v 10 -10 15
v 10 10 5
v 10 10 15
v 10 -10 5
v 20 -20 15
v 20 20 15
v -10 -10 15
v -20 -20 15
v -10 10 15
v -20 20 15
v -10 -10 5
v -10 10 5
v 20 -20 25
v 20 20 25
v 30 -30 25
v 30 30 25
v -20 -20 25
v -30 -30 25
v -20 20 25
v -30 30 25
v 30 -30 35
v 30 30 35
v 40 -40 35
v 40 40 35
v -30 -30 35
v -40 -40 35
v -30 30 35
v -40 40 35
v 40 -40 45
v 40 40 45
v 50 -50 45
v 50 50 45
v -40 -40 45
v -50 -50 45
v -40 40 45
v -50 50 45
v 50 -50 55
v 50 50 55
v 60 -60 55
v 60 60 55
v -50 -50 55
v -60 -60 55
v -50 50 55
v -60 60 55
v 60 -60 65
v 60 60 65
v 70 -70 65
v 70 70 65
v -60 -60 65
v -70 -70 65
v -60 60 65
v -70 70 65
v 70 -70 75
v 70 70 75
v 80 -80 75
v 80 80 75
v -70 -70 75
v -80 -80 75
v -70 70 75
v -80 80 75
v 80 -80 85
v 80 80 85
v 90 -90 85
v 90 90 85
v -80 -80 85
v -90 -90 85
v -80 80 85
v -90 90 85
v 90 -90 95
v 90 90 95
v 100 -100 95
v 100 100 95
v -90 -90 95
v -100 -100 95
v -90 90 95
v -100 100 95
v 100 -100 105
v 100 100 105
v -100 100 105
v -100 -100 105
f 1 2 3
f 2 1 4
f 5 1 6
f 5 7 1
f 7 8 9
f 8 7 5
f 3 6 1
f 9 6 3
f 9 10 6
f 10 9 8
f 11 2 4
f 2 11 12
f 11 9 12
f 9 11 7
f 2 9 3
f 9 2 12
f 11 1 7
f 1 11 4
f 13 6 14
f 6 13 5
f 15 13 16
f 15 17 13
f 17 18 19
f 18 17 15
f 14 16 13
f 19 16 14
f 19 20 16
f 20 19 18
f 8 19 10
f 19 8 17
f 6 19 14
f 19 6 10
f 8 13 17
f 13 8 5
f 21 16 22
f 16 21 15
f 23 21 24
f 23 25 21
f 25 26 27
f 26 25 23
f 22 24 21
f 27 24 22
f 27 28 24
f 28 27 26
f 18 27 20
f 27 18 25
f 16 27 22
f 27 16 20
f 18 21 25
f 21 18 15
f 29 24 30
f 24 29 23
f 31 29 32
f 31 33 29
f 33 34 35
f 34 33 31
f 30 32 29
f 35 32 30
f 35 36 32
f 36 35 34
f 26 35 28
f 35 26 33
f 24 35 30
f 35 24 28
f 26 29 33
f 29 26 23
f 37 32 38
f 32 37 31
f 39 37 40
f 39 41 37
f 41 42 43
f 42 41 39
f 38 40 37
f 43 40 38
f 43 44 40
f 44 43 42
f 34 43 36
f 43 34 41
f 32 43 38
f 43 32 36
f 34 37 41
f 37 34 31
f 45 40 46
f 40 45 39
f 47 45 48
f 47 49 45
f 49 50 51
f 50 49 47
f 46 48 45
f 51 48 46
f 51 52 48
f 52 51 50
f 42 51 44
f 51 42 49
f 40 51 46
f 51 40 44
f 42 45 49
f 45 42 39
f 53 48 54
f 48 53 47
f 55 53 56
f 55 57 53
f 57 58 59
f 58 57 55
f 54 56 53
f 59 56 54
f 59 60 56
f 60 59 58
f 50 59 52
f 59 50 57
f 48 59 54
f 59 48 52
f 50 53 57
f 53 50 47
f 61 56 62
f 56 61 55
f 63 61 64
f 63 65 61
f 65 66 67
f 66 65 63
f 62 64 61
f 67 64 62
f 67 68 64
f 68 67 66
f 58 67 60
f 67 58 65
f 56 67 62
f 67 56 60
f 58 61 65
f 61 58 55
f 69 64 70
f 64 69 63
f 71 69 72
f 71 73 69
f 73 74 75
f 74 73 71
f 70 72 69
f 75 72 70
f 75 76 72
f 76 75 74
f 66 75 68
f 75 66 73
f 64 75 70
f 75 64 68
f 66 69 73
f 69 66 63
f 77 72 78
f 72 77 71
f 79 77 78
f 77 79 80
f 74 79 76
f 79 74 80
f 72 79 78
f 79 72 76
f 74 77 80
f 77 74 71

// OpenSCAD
for(i=[1:1:10]){
    
    translate([0,0,i*10]) cube([i*20, i*20, 10], center=true);
    
}
